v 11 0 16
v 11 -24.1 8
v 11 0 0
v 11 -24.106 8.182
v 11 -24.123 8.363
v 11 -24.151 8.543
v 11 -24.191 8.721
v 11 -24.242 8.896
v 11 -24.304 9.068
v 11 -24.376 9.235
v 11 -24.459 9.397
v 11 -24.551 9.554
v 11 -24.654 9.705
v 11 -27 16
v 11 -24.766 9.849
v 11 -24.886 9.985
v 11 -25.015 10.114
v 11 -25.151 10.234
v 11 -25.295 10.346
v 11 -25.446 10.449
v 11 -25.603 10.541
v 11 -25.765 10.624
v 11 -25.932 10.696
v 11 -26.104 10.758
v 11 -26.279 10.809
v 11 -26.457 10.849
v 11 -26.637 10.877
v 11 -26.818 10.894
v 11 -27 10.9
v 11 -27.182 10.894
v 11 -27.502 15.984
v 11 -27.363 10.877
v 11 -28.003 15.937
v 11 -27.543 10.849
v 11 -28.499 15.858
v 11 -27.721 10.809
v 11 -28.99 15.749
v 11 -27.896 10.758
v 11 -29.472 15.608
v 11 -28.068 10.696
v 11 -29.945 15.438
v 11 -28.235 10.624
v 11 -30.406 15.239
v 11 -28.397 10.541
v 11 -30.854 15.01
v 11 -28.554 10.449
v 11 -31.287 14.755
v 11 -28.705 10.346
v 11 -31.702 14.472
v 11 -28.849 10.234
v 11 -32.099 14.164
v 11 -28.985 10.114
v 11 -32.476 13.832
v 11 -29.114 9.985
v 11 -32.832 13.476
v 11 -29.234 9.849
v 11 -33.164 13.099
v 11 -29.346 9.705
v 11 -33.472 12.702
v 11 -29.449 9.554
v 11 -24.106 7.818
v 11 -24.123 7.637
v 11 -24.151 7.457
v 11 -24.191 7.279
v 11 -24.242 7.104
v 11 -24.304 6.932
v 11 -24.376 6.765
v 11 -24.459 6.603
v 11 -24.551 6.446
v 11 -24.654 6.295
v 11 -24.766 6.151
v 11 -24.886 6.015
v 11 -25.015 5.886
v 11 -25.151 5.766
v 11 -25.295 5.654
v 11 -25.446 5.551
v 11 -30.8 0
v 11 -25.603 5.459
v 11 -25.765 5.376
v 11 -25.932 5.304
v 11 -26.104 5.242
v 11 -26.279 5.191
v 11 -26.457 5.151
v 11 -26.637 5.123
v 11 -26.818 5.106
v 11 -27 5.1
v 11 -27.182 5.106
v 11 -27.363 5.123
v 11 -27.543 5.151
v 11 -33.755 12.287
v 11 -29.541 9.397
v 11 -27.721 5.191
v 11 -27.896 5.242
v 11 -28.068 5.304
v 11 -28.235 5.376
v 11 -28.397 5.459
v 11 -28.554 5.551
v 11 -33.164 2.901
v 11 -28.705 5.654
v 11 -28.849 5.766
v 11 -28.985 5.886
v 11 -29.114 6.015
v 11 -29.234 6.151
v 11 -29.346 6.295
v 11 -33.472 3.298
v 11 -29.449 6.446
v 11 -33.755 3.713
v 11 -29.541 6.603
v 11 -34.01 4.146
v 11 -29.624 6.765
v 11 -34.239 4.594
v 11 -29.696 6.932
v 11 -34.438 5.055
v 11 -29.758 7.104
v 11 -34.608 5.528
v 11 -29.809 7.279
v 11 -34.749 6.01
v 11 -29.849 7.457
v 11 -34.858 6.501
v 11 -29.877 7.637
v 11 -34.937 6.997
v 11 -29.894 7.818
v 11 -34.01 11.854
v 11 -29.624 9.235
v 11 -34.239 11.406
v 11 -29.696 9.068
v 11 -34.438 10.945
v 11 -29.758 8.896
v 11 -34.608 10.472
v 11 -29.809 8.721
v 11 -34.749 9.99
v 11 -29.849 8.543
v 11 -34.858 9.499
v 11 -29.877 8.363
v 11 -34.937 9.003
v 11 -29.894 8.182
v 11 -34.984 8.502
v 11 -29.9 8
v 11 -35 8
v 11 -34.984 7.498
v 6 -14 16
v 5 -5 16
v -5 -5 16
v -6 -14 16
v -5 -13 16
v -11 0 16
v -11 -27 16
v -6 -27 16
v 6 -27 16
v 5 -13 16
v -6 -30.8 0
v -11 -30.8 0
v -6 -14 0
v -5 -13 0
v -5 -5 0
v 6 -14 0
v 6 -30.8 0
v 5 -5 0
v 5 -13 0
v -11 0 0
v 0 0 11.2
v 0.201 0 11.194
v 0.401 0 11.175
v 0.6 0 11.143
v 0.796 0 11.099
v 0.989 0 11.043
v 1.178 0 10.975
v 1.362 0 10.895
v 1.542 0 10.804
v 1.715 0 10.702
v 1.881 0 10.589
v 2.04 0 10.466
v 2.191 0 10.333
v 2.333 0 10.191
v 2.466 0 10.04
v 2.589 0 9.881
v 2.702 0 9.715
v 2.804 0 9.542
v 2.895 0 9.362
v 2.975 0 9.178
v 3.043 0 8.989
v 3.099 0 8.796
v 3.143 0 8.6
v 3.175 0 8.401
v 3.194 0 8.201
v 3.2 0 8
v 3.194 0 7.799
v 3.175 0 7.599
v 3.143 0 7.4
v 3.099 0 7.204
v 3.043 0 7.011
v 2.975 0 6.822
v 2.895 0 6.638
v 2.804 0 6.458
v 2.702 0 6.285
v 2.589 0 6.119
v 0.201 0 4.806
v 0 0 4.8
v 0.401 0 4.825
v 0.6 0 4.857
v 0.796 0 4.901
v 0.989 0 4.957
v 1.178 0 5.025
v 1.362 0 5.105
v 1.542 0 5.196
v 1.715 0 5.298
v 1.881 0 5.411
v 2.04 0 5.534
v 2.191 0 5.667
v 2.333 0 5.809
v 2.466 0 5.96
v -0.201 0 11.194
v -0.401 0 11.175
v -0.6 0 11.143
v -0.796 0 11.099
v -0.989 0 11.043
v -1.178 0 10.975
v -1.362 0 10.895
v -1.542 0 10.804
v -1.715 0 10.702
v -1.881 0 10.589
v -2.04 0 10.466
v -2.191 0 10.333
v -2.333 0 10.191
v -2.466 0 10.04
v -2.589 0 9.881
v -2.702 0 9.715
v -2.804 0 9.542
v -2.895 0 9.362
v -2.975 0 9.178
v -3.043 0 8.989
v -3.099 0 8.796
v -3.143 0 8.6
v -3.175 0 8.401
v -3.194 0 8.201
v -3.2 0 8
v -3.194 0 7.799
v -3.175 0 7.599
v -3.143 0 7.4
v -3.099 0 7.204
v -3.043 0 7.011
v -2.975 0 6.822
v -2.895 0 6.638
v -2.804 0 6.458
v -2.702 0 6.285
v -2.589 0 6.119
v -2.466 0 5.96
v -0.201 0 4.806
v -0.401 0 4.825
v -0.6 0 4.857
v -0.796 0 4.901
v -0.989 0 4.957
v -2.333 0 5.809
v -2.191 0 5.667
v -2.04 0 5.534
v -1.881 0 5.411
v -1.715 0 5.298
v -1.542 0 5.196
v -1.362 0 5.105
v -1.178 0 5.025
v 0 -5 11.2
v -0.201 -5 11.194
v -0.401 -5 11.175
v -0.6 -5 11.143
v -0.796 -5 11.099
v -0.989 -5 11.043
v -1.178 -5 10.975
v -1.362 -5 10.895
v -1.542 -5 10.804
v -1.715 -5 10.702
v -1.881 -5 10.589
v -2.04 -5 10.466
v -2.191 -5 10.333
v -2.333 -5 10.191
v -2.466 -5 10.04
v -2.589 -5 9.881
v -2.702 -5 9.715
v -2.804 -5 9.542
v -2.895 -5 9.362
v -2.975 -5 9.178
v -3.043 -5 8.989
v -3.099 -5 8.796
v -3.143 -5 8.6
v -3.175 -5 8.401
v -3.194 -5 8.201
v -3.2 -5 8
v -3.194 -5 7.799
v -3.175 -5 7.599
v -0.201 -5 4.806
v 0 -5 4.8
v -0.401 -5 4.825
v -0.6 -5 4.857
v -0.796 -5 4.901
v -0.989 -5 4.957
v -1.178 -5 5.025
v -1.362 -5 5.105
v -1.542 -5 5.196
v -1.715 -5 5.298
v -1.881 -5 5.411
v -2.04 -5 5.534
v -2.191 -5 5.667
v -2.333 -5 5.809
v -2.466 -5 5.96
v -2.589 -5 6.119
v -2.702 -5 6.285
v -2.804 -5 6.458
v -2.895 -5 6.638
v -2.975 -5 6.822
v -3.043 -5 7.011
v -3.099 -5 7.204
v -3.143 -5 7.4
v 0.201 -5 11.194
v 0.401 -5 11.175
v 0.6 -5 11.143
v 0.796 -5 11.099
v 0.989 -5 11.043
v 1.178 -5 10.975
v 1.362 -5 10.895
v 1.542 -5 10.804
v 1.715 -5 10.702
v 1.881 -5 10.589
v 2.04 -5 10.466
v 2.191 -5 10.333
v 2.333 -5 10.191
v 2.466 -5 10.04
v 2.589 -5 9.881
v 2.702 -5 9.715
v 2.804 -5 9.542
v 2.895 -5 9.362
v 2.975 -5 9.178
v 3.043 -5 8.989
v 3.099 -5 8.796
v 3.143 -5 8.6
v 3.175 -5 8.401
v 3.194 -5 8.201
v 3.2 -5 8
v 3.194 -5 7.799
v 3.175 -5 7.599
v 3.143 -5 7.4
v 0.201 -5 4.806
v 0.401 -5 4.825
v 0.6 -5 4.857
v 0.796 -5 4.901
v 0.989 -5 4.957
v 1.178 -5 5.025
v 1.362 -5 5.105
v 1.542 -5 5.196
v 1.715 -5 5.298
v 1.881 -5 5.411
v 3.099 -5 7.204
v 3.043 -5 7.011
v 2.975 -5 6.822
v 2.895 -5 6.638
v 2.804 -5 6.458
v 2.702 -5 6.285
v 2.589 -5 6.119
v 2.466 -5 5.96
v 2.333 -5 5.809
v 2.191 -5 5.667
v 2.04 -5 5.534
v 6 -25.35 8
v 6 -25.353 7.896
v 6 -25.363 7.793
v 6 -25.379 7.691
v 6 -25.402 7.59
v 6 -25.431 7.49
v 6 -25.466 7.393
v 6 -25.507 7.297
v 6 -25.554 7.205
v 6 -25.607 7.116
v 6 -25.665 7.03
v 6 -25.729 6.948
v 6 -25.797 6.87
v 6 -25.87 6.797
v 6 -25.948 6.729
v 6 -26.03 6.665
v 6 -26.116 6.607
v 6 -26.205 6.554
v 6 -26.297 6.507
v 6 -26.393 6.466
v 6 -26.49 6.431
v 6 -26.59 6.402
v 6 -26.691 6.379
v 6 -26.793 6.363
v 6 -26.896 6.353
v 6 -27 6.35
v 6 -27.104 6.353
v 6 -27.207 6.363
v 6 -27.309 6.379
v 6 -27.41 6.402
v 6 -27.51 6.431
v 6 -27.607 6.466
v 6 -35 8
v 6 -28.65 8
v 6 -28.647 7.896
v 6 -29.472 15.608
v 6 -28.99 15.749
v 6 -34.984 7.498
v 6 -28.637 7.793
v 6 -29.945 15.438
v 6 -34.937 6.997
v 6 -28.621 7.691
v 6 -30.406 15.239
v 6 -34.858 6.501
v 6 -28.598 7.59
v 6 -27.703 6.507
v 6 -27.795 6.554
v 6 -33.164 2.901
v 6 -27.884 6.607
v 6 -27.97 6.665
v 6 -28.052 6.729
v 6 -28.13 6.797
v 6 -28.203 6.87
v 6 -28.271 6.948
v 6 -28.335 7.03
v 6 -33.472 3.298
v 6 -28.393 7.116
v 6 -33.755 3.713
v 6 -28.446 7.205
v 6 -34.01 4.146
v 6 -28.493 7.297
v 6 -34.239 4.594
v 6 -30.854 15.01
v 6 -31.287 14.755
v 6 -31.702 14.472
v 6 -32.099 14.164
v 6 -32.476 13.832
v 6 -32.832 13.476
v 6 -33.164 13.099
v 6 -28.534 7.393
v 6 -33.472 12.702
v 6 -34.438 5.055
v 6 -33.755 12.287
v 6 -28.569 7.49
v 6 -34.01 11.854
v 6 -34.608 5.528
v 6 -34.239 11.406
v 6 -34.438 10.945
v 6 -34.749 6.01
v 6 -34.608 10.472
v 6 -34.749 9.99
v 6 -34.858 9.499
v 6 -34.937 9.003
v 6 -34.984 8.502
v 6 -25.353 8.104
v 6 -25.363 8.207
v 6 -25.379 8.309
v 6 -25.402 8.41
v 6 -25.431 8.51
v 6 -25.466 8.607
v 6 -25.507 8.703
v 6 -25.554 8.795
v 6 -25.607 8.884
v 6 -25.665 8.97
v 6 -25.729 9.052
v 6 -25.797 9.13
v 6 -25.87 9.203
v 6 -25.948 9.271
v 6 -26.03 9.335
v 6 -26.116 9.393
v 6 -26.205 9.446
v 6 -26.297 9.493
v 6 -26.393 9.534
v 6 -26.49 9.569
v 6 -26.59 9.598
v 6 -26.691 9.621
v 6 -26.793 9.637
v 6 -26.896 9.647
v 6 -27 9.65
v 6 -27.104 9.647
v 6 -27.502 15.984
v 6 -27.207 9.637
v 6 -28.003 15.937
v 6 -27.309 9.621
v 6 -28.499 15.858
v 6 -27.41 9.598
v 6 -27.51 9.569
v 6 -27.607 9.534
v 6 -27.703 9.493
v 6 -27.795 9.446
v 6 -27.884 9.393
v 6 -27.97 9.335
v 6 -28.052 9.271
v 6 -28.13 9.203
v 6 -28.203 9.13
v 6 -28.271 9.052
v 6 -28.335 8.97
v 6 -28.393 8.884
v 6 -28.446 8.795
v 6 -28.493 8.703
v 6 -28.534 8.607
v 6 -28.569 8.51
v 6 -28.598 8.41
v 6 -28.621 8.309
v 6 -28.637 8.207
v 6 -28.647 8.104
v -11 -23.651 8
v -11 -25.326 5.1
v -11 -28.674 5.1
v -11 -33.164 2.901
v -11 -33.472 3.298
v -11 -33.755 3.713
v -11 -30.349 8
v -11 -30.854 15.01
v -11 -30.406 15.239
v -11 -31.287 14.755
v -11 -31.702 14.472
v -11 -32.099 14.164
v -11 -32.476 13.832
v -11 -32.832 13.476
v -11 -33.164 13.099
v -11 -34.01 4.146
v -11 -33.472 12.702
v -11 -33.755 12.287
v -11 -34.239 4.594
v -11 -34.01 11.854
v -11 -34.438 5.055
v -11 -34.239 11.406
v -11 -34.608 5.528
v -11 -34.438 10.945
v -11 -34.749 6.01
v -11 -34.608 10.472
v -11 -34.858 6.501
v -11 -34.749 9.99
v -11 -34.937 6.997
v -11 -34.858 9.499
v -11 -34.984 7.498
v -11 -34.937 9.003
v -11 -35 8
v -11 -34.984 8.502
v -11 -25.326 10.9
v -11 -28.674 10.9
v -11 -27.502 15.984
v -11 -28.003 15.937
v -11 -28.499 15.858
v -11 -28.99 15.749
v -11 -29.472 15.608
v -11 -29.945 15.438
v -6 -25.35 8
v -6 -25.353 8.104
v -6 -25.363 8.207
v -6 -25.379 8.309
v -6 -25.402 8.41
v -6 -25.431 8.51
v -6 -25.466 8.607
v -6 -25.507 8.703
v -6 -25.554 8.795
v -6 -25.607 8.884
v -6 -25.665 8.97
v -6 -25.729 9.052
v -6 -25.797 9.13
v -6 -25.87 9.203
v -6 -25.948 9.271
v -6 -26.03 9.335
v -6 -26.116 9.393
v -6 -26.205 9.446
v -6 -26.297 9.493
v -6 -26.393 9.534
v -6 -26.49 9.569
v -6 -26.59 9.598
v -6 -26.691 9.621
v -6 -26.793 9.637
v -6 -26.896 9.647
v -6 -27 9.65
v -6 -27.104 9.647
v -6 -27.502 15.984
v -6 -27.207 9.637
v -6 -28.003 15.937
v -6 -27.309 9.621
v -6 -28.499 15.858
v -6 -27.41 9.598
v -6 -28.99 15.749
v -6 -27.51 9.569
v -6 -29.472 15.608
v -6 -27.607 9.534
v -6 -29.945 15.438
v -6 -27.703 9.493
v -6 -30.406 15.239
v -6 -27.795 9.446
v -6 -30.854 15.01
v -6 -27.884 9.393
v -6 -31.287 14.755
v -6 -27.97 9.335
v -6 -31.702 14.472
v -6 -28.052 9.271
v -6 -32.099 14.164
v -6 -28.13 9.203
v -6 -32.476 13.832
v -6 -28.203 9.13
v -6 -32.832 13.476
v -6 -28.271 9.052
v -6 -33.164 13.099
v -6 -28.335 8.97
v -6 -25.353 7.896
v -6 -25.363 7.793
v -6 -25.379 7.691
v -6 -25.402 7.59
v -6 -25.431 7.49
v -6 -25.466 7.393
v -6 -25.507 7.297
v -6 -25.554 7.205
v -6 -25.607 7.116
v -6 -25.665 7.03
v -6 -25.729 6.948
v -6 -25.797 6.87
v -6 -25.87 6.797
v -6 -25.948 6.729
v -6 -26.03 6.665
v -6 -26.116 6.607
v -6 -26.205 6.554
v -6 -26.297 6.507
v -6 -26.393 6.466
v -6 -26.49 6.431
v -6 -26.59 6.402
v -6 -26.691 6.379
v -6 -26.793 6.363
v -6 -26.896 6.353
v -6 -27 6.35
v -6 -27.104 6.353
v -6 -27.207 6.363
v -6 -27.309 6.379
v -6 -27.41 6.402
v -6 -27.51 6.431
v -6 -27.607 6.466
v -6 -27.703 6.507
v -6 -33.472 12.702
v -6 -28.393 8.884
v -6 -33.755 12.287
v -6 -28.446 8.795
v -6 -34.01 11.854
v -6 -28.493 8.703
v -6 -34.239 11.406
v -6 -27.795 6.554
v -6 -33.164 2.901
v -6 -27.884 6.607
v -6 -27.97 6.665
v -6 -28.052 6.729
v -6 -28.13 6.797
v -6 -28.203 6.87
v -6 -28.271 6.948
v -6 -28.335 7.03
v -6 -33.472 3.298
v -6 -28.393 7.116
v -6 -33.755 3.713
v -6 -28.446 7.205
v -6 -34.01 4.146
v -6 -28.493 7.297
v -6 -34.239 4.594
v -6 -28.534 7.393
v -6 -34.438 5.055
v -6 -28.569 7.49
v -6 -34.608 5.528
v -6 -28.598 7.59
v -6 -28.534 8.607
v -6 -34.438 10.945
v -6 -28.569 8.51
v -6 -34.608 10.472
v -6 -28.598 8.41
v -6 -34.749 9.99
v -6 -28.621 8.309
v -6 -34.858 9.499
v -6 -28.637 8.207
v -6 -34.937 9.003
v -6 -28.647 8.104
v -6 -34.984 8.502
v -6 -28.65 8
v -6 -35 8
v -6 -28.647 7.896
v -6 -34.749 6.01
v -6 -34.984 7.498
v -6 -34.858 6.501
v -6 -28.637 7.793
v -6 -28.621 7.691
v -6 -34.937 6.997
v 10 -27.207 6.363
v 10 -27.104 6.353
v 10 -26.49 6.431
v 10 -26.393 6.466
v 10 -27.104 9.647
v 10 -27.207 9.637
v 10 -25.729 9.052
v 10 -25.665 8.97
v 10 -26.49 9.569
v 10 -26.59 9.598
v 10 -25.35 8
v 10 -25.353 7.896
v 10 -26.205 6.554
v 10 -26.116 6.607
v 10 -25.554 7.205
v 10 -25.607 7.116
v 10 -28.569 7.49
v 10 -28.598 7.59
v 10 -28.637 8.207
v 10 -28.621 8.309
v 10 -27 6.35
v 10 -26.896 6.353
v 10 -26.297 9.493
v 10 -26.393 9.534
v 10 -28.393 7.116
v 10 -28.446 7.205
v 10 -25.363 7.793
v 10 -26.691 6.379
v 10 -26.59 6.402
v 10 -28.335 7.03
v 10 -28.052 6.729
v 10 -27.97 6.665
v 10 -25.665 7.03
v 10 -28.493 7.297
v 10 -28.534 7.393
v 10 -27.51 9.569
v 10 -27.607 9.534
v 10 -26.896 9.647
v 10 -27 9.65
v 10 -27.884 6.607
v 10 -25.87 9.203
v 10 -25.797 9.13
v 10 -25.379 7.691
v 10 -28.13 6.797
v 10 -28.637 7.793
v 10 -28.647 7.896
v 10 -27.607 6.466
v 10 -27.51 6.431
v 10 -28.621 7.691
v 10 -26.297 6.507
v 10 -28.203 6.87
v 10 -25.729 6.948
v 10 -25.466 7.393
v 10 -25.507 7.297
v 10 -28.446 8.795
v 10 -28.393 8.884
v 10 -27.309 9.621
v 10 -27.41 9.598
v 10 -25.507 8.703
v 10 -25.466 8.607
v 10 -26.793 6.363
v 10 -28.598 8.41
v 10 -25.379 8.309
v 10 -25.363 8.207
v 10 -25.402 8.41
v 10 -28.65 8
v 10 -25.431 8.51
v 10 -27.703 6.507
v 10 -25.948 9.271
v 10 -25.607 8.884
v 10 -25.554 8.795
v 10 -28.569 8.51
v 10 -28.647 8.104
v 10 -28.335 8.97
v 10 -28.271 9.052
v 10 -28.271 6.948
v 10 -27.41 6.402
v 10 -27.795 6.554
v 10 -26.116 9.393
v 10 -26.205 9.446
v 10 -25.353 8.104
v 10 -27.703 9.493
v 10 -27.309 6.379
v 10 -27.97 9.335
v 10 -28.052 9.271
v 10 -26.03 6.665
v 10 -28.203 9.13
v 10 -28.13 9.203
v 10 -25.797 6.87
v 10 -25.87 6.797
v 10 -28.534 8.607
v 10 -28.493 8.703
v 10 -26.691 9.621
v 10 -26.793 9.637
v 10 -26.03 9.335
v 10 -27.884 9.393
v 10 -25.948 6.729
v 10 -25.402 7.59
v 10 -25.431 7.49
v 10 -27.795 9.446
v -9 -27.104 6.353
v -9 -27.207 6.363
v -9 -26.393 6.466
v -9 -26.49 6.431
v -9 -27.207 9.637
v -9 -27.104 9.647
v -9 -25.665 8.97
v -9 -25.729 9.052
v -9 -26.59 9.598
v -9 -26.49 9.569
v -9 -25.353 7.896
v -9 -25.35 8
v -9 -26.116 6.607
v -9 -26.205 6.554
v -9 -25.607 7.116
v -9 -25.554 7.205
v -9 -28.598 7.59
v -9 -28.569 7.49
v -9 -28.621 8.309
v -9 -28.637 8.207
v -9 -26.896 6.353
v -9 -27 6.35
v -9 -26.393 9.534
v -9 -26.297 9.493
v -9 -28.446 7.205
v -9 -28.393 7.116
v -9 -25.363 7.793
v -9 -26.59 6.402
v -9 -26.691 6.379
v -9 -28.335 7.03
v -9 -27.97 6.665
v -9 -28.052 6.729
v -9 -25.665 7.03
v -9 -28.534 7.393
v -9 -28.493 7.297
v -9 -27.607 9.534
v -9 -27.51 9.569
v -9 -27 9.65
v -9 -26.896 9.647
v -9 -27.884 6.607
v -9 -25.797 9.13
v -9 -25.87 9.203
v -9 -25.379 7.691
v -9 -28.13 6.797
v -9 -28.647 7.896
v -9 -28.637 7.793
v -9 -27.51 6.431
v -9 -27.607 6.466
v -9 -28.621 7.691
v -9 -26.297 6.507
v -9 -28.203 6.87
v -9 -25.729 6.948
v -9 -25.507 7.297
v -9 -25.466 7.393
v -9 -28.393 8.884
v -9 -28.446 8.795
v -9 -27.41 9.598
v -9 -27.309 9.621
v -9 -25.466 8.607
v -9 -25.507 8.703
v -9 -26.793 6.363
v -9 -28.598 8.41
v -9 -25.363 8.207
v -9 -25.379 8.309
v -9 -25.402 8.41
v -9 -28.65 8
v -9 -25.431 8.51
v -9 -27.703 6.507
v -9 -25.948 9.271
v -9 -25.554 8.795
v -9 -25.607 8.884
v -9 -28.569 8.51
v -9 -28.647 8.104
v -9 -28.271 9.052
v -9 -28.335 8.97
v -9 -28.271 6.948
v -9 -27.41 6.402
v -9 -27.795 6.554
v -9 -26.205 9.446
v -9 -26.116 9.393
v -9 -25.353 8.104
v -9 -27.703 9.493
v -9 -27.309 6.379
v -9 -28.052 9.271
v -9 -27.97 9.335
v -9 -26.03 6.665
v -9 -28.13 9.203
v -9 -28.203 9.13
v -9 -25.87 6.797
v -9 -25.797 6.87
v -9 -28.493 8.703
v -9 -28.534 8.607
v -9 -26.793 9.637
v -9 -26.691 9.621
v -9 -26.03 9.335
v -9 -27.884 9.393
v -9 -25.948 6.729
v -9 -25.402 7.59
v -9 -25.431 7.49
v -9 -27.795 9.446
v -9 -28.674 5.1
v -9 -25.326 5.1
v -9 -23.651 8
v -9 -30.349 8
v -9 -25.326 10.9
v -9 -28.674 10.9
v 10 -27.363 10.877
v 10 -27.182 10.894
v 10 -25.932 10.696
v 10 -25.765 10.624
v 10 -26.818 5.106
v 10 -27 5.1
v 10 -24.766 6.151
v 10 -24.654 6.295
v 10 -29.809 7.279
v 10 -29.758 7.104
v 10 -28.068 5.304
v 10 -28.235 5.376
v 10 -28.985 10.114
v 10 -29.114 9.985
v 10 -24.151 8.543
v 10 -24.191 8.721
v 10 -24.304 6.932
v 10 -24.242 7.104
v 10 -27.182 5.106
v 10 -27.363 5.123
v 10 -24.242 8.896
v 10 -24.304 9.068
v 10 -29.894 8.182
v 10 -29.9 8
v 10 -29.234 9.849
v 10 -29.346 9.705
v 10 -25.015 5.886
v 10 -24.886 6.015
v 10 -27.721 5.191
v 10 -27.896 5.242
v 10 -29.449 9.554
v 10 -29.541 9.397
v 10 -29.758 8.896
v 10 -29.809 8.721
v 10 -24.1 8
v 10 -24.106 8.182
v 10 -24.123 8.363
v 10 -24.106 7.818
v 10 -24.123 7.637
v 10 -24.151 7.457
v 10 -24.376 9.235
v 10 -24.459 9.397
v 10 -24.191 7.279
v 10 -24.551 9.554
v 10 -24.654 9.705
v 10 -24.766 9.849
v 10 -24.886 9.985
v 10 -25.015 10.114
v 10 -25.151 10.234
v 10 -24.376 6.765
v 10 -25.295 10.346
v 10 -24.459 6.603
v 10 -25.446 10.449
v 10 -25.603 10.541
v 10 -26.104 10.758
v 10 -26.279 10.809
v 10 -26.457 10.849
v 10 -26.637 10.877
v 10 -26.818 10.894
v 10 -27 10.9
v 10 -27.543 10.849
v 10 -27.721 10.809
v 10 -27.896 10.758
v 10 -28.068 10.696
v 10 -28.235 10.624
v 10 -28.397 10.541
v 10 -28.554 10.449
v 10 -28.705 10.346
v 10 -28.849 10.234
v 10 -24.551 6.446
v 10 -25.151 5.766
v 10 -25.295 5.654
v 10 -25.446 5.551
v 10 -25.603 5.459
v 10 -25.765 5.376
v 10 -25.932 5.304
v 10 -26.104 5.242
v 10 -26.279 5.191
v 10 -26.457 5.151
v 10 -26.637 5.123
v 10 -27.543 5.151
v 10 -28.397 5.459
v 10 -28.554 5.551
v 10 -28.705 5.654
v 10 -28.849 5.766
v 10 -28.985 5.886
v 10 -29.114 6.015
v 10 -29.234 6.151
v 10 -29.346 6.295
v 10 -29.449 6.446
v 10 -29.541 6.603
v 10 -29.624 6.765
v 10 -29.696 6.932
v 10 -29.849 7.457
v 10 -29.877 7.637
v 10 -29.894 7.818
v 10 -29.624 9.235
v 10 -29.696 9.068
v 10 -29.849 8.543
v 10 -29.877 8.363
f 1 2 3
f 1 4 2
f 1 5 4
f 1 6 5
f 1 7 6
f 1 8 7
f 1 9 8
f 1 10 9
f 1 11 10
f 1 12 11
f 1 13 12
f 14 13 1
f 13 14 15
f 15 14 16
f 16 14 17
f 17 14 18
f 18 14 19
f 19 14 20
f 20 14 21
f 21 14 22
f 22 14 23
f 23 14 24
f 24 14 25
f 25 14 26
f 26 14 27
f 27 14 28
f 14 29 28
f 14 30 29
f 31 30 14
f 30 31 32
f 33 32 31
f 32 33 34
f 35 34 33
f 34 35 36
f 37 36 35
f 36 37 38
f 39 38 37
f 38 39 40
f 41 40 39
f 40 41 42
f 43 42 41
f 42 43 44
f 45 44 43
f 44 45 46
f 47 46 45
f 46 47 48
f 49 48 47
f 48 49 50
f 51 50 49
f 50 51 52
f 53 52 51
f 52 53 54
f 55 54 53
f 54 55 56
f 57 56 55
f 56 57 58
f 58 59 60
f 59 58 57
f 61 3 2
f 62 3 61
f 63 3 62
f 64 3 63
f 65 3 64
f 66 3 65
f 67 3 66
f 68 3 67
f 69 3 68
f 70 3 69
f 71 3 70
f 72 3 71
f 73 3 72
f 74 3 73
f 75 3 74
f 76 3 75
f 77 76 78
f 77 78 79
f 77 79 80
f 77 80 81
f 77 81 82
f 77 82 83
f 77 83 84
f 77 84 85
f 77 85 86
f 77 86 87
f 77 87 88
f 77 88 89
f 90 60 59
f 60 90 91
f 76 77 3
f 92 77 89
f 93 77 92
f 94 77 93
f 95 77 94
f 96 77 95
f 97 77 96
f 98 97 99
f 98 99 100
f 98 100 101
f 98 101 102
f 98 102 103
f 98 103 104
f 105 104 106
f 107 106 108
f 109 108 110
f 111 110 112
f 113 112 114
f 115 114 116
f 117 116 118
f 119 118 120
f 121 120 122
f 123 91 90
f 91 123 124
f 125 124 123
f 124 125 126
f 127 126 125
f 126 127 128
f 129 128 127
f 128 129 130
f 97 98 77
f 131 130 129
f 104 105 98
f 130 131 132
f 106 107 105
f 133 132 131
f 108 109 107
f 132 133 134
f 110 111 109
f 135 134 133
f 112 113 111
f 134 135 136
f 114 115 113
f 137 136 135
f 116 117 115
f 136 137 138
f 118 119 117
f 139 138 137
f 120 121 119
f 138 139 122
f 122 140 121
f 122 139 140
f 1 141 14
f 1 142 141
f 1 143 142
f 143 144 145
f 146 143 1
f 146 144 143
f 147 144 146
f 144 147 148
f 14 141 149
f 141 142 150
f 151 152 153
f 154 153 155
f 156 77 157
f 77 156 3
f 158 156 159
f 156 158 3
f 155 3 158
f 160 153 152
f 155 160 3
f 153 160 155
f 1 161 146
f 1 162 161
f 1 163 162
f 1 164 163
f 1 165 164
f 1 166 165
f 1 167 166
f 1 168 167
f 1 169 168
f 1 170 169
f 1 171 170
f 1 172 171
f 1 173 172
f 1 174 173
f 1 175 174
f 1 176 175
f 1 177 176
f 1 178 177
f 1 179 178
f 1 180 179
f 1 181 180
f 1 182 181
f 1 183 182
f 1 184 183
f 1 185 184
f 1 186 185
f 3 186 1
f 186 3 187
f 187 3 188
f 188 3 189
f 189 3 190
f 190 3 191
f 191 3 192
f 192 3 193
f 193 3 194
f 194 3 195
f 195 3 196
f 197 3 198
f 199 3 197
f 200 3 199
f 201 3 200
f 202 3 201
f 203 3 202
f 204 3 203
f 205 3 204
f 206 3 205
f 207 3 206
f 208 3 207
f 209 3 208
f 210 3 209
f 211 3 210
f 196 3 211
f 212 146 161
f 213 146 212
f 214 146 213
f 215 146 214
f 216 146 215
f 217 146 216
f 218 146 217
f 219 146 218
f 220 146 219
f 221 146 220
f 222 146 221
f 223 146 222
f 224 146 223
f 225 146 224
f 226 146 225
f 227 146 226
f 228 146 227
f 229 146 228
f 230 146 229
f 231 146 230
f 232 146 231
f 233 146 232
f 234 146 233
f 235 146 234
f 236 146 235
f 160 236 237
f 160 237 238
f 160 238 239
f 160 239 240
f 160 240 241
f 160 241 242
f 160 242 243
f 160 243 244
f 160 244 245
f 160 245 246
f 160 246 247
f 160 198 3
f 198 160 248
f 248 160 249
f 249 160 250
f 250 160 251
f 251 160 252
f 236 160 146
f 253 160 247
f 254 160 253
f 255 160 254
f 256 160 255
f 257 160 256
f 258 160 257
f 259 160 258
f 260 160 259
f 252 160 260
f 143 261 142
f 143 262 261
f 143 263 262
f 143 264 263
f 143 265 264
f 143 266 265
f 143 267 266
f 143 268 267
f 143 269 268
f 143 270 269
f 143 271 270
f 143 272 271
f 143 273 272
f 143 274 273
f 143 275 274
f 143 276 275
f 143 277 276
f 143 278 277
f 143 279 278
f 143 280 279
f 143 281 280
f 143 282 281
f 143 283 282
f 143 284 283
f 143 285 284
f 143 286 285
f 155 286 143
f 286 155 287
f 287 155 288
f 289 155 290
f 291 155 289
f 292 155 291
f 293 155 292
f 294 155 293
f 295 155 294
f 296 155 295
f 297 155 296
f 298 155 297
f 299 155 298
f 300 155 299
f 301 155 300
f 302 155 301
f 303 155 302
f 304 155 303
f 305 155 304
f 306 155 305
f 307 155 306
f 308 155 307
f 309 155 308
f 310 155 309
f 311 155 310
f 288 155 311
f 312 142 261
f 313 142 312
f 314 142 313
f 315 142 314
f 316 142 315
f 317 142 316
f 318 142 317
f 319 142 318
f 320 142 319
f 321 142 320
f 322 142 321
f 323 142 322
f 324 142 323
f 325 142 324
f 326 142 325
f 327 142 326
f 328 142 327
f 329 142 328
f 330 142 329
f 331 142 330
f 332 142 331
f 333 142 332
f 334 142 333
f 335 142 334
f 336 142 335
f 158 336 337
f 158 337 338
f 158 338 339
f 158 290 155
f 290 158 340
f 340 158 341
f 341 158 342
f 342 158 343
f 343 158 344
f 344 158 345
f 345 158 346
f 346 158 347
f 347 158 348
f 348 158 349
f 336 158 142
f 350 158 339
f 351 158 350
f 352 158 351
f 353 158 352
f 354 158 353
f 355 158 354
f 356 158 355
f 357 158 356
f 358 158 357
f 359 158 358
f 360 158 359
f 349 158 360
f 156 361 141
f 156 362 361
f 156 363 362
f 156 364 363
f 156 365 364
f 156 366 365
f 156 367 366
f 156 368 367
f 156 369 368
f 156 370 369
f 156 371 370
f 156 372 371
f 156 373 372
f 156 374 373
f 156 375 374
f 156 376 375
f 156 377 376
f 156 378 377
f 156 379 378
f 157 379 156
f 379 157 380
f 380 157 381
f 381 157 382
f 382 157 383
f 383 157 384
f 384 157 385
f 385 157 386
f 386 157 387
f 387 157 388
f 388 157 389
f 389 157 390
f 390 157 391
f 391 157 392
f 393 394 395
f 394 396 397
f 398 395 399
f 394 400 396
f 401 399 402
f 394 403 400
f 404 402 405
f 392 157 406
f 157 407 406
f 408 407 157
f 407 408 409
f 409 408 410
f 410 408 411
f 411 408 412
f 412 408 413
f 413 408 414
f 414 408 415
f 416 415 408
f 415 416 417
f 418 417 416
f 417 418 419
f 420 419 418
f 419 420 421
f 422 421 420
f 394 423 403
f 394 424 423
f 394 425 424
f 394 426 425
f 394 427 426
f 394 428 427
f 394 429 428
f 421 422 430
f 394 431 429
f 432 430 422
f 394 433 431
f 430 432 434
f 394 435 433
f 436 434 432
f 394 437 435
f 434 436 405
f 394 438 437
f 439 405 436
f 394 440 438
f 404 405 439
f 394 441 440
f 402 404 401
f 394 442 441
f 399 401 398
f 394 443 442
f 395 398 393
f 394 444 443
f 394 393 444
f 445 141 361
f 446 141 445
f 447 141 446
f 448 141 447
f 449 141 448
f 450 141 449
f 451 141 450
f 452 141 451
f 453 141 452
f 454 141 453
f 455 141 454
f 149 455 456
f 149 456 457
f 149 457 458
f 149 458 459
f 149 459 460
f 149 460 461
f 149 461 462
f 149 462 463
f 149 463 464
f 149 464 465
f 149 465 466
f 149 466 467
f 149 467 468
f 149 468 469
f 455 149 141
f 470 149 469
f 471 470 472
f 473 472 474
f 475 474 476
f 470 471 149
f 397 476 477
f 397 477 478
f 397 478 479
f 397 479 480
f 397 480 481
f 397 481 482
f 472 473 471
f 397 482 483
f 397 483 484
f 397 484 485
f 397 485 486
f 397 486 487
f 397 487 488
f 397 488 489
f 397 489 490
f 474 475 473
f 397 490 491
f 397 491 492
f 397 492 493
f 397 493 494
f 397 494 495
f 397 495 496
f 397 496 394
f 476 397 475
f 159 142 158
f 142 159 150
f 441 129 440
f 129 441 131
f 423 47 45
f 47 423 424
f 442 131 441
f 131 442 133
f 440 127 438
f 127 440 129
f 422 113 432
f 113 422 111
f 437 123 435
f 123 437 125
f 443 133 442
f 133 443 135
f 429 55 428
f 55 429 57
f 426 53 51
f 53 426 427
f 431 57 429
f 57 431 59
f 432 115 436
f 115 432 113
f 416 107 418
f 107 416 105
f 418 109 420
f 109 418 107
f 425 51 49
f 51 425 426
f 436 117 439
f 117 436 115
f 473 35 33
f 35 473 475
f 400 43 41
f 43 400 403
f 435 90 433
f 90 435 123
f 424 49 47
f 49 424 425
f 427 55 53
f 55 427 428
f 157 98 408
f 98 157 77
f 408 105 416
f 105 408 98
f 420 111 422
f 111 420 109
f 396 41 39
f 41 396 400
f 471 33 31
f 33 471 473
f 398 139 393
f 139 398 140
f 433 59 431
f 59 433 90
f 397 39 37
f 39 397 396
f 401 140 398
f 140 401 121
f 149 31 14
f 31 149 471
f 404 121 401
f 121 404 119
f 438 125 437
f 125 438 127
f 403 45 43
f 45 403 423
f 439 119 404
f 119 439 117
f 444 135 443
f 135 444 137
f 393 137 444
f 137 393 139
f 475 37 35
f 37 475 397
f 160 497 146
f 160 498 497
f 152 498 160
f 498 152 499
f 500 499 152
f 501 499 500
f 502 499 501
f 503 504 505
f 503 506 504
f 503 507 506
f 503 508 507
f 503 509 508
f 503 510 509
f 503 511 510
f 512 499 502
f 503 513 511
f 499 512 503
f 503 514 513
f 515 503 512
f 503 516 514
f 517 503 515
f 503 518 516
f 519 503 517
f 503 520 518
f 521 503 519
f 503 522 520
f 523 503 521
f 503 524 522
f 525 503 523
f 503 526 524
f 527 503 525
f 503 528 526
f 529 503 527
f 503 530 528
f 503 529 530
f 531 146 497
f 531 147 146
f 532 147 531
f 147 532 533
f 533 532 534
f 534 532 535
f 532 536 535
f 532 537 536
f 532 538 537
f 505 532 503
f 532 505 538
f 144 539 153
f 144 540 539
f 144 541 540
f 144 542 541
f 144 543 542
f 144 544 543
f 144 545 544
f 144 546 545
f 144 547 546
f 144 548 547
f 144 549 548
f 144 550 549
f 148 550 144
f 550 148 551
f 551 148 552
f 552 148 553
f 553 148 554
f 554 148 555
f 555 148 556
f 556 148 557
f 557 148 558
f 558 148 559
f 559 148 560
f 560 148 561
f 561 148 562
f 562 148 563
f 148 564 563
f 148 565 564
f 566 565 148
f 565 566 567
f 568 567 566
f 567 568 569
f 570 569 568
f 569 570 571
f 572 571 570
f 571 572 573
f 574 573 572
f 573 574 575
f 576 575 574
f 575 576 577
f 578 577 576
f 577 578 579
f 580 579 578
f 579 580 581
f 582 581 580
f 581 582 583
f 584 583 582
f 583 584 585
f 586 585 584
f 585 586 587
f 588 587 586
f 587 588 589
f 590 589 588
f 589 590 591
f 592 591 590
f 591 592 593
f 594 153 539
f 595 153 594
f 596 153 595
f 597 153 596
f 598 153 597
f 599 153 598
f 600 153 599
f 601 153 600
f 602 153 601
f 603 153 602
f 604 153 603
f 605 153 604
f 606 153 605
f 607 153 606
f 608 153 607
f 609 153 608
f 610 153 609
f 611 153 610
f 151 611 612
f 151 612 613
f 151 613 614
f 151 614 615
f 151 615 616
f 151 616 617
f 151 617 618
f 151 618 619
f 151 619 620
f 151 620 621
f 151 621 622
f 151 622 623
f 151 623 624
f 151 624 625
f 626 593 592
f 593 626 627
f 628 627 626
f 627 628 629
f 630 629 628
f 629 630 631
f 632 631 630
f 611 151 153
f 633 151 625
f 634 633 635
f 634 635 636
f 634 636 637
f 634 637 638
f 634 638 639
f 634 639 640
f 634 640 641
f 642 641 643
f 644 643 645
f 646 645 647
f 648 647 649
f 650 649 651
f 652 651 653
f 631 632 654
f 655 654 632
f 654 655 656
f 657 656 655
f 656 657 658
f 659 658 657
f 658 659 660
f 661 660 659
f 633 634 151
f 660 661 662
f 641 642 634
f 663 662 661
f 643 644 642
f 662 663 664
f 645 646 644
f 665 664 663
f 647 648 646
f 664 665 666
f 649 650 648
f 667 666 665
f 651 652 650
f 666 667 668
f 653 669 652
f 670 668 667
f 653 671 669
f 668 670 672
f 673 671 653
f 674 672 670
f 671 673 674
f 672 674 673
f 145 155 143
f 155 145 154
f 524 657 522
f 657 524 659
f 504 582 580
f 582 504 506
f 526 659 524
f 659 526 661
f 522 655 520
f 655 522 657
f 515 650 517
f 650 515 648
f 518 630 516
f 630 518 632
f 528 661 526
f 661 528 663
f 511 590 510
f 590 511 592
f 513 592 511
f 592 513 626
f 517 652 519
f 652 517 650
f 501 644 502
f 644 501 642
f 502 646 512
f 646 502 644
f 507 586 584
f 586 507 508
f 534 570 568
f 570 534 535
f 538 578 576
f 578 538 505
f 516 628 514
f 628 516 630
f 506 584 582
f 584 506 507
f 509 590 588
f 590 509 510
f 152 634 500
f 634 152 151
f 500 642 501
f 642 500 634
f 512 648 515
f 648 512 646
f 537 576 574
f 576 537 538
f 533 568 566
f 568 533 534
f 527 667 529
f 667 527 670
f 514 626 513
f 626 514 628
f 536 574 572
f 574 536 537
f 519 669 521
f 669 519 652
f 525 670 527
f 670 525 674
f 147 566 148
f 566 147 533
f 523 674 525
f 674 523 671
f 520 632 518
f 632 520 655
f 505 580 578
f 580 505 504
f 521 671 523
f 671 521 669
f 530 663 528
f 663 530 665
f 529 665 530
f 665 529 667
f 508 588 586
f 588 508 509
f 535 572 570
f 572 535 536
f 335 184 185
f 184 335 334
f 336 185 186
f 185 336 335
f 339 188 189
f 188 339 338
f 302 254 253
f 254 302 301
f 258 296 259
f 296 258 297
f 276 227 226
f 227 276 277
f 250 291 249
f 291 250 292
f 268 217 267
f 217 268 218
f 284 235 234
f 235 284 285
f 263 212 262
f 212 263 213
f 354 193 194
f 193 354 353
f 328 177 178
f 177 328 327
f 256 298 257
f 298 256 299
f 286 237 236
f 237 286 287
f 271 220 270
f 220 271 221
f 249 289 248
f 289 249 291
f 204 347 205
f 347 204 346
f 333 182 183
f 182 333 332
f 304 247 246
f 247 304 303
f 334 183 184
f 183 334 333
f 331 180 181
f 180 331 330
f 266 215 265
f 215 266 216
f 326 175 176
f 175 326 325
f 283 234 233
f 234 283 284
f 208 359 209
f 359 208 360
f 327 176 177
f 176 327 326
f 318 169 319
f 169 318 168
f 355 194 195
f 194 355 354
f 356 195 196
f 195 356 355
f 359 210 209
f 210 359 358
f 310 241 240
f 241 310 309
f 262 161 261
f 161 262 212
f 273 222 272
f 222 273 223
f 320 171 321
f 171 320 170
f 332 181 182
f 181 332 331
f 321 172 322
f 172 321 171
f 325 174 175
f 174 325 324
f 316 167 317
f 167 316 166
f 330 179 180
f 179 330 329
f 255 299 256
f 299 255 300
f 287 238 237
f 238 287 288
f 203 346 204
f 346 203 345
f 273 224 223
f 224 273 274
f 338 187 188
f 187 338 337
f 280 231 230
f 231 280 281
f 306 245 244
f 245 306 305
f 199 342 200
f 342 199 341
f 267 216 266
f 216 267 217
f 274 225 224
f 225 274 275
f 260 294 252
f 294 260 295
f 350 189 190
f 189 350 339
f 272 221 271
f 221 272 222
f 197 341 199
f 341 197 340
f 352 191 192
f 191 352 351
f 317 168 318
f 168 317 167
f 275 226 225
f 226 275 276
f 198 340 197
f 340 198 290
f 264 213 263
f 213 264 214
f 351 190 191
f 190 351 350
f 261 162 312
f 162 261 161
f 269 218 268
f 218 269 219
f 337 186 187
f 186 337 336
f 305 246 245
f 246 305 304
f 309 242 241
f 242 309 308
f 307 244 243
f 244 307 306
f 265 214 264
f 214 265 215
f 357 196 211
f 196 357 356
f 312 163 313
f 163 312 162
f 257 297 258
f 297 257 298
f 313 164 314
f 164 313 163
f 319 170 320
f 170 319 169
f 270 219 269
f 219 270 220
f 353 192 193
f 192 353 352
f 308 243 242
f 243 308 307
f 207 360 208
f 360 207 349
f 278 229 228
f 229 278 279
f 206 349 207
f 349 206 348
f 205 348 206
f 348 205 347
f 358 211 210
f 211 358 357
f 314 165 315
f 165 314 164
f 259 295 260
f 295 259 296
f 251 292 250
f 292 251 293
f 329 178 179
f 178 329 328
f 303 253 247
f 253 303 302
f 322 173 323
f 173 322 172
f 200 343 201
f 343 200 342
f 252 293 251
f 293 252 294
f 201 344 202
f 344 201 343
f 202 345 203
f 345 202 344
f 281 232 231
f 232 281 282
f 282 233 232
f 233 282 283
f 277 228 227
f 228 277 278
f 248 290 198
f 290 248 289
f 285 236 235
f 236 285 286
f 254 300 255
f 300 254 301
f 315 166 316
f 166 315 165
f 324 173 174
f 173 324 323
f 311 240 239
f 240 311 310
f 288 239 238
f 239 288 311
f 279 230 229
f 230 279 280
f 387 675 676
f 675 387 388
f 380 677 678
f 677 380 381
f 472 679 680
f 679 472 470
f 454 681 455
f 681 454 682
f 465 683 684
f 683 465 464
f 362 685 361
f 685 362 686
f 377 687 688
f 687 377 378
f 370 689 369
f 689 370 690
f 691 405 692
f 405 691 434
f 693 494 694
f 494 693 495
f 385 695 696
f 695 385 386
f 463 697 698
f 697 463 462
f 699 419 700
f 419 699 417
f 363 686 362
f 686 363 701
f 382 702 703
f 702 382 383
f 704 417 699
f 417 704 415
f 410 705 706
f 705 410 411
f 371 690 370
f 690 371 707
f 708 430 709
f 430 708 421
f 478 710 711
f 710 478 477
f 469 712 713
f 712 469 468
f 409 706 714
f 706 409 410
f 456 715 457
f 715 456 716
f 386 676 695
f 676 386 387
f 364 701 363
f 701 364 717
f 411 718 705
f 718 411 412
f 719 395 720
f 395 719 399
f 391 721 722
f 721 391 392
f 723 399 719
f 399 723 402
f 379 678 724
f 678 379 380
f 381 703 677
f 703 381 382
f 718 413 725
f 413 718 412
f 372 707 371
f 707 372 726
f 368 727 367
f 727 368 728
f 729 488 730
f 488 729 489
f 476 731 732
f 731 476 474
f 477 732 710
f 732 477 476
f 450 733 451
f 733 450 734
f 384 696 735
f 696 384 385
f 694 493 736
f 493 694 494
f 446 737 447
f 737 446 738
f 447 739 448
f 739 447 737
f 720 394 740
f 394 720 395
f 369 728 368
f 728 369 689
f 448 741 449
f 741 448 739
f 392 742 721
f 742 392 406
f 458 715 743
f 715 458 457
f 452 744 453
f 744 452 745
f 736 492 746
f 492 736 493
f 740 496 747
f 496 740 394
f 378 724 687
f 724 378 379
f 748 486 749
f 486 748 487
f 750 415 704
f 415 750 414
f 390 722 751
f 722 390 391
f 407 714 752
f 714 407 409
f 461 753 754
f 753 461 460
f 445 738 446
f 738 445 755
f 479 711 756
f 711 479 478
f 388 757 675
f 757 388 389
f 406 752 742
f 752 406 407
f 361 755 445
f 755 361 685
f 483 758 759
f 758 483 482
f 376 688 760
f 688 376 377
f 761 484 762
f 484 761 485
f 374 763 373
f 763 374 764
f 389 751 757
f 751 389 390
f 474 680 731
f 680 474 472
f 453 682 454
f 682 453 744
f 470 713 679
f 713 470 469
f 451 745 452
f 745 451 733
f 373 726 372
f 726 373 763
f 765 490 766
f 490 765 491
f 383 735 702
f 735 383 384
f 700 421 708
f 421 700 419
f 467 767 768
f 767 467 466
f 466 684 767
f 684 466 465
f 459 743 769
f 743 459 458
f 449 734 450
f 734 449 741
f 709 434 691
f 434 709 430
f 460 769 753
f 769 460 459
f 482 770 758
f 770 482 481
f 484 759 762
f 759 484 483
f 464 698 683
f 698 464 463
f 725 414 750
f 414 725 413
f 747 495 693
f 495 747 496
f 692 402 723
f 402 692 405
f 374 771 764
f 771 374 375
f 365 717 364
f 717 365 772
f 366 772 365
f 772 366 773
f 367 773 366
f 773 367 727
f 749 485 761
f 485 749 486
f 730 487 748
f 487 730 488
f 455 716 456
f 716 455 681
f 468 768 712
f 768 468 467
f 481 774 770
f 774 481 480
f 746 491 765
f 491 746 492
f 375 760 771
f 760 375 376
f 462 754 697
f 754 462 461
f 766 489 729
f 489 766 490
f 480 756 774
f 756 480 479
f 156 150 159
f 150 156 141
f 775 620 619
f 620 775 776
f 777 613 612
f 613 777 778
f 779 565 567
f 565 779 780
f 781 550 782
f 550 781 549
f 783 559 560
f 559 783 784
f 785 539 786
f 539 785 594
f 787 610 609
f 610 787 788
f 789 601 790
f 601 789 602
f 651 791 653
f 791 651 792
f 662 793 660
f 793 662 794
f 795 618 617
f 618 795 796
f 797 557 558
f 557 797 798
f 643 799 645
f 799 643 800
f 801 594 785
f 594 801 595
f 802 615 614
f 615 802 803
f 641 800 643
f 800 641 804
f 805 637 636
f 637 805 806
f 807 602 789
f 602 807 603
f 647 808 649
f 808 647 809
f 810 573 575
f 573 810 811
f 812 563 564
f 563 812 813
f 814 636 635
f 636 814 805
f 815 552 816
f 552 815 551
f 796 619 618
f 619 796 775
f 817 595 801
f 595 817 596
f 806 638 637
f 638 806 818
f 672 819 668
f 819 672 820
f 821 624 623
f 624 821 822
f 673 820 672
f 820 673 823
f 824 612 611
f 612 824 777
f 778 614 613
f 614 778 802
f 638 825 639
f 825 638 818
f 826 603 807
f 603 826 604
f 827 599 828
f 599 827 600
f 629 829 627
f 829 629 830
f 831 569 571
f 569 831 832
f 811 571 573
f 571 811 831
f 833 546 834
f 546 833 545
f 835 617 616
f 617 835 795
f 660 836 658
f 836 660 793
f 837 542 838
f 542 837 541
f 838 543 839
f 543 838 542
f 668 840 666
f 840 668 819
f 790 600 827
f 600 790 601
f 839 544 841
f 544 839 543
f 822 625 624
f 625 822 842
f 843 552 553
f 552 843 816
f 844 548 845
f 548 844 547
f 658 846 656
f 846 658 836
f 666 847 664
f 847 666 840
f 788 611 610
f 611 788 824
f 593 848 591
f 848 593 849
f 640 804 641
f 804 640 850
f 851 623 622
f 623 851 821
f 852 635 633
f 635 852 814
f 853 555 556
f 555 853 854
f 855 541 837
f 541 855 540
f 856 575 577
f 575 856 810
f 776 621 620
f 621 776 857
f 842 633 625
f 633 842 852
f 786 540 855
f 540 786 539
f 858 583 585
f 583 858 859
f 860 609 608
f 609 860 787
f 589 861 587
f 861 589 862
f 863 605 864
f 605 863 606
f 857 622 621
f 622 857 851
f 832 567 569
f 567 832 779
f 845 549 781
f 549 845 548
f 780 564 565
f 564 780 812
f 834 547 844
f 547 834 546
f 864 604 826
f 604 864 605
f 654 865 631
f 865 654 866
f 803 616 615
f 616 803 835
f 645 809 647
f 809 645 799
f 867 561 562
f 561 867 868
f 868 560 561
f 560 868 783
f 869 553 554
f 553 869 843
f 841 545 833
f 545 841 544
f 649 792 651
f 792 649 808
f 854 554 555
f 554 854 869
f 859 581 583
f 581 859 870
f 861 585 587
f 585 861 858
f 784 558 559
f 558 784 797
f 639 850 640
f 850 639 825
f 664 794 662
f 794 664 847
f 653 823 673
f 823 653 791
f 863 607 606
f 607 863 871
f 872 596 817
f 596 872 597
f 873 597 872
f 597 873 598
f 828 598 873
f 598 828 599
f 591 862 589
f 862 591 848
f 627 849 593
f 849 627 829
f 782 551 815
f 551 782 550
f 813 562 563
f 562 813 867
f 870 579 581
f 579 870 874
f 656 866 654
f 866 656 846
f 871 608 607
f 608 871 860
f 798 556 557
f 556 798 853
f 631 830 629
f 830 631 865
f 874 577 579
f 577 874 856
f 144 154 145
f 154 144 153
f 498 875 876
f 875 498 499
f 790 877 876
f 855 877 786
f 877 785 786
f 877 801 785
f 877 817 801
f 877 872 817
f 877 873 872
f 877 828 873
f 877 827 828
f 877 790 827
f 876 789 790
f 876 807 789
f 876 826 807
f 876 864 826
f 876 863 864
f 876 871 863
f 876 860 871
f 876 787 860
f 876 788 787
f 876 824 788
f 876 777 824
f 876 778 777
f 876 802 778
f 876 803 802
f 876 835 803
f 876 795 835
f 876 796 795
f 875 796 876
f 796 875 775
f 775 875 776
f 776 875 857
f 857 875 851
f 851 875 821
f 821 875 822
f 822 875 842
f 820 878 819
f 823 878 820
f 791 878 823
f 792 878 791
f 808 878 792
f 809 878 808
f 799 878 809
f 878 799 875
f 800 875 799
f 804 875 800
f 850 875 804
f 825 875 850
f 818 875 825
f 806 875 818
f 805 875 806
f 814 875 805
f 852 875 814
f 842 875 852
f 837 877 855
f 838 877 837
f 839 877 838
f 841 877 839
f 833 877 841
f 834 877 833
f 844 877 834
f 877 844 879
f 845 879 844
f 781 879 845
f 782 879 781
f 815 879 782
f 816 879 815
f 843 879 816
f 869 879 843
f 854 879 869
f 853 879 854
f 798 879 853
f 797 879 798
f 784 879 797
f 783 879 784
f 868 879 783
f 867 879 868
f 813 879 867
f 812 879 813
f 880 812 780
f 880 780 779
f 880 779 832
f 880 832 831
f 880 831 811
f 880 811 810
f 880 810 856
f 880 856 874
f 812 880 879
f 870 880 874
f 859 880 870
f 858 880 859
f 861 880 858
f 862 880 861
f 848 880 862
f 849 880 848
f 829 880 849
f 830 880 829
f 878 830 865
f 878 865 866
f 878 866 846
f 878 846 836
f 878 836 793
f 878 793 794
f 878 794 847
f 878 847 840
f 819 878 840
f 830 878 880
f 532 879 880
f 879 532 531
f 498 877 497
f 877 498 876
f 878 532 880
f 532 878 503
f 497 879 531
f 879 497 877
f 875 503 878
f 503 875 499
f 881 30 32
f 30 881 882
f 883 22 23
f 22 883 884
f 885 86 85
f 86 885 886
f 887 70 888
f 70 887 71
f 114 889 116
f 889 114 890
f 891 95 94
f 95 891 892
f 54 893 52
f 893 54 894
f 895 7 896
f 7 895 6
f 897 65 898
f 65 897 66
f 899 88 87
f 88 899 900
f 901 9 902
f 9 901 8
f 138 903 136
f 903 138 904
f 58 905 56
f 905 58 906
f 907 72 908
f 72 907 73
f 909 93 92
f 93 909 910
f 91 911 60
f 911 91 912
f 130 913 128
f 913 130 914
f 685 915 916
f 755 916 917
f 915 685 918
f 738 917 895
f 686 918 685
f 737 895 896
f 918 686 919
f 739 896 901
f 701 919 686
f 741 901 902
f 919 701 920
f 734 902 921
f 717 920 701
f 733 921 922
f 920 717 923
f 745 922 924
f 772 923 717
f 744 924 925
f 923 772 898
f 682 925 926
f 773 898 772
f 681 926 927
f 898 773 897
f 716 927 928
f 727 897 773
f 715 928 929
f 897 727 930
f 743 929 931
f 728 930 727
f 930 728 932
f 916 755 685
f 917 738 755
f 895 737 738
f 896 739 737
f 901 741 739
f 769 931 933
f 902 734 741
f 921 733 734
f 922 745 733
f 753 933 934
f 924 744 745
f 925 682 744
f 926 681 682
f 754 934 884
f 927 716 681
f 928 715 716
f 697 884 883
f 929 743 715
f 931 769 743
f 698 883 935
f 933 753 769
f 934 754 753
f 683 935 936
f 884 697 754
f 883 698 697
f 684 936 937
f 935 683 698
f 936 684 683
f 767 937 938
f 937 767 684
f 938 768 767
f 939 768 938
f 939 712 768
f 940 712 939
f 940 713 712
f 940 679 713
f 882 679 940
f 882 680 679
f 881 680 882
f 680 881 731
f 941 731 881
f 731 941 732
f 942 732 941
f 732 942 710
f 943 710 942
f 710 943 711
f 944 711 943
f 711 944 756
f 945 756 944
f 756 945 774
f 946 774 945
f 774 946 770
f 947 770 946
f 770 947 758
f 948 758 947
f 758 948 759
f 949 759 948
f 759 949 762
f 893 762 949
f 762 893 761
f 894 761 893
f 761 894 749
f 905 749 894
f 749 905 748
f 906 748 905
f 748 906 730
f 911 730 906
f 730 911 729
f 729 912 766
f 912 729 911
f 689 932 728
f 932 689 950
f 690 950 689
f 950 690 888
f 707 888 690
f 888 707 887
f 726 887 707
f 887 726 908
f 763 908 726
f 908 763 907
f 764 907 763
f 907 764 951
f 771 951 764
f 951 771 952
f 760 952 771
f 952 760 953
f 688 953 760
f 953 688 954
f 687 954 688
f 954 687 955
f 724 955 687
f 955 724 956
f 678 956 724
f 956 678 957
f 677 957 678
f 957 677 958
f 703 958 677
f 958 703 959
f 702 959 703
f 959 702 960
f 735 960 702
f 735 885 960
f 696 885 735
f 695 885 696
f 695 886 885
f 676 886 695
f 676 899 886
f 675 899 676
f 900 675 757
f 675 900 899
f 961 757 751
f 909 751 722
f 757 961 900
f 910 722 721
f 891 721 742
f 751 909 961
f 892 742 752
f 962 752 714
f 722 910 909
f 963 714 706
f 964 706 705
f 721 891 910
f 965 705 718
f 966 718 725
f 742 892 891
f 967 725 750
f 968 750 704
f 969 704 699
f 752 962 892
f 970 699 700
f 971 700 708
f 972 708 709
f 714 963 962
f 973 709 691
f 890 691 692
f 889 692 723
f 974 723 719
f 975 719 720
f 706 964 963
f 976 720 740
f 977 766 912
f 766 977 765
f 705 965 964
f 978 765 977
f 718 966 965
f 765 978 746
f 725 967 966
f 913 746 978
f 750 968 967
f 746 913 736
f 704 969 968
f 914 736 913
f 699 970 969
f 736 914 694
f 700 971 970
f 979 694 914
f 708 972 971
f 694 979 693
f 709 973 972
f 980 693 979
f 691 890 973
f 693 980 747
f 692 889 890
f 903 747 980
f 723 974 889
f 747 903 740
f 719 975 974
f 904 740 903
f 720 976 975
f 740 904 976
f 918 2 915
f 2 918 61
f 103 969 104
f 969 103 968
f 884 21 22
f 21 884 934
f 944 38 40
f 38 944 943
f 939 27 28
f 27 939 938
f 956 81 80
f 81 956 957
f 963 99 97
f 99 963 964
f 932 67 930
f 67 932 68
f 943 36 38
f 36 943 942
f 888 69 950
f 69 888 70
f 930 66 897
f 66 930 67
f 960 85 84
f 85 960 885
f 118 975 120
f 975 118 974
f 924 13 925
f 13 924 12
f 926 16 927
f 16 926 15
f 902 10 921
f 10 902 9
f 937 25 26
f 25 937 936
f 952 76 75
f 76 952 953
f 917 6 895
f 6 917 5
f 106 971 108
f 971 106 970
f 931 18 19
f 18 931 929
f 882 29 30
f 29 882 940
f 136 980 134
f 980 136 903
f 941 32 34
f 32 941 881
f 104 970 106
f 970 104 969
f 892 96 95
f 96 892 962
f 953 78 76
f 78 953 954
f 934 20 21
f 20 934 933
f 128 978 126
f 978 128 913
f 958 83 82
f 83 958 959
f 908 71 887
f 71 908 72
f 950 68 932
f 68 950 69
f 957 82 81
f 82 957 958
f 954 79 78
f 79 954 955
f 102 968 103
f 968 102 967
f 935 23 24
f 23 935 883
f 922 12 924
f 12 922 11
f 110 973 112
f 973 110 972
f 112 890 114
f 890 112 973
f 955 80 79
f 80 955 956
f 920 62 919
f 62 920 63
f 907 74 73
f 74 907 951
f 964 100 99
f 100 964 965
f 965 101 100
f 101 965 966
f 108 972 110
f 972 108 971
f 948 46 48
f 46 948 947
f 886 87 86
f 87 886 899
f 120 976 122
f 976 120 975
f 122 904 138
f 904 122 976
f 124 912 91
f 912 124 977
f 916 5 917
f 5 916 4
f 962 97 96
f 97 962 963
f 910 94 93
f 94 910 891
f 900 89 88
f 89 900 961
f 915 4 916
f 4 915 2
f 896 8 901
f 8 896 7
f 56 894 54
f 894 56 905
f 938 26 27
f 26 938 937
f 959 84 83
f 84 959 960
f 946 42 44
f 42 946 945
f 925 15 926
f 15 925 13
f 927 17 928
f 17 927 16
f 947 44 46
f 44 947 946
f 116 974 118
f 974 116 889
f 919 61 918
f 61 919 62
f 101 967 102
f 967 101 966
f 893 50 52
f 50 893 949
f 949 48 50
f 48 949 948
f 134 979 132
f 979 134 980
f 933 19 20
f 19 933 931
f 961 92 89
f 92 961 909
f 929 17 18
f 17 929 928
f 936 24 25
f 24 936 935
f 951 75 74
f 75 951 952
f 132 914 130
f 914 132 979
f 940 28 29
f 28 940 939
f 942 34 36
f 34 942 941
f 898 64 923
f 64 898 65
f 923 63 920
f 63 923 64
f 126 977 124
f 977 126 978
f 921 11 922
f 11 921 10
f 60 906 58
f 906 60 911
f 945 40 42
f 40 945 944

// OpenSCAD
// Created from Code_Yidler_623.stl
// https://github.com/Mecan0/Code
// By J.Rodigo (www.jra.so)
// Licence Creative commons atribution & share alike.

/**************************/
// Parámetros de la pieza  /
/**************************/

dTal = 6.4;		// Diámetro del taladro (Soporte) (6.4)

//Características del tornillo (Polea)
dTor = 3.3;		// Diámetro de la rosca (3.3)
dCab = 5.8;		// Diámetro de la cabeza (5.6)
hHex = 5.8;		// Altura entre caras planas de la tuerca (5.8)


// Media pieza
module mpieza(){
	// Bloque a lo largo del eje X
		translate([0, -5, 0])
		cube([11, 5, 16]);

	//	Bloque a lo largo del eje Y
	//	Bloque grande
		translate([6, -27, 0])
		cube([5, 27, 16]);
	//	Bloque pequeño
		translate([5, -14, 0])
		cube([1, 9, 16]);
		hull(){
			//	Redondeo
			translate([6, -27, 8])
			rotate( 90, [0, 1, 0])
			cylinder(h = 5, r = 8, $fn=100);
			// Chaflán inferior
			translate([6, -30.8, 0])
			cube([5, 10, 1]);
		}
}

// Operaciones para media pieza
module moperaciones(){
	// Taladro del soporte
	translate([0, 1, 8])
	rotate( 90, [1, 0, 0])
	cylinder(h = 7, r = dTal/2, $fn=100);
	// Taladro para la polea
	translate([5, -27, 8])
	rotate( 90, [0, 1, 0])
	cylinder(h = 7, r = dTor/2, $fn=100);
	// Chaflán interior
	translate([6, -14, -1])
	rotate( 225, [0, 0, -1])
	cube([2, 1, 18]);
}

// Generar un hexágono circunscrito (Diámetro,Altura) 
module hexagono(d,h){ 
	for (a = [0, 60,120]){ 
		rotate( a, [0, 0, 1])
		cube([d, d*tan(30), h], center = true);
	}
}

// Alojamiento de la cabeza del tornillo 
module tcab(){ 
	translate([10, -27, 8])
	rotate( 90, [0, 1, 0])
	cylinder(h = 2, r = dCab/2, $fn=100);
}

// Alojamiento de la tuerca
module tuerca(){ 
	translate([-11, -27, 8])
	rotate( 90, [0, 1, 0])
	hexagono(hHex, 4);

}

// Creamos la pieza a partir de las operacione
module pieza(){
	difference () {
		union() {
			// Pieza situada en {+X,-Y,+Z}
			mpieza();	
		
			// Pieza simétrica situada en {-X,-Y,+Z}
			mirror([ 1, 0, 0 ])
			mpieza();
		}	
		union() {
			// Operaciones situadas en {+X,-Y,+Z}
			moperaciones();
	
			// Operaciones simétricas situadas en {-X,-Y,+Z}
			mirror([ 1, 0, 0 ])
			moperaciones();

		// Operaciones únicas para cada lado
			// Vaciado para la cabeza del tornillo
			tcab();
			// Vaciado para la tuerca hexagonal 
			tuerca();
		}	
	}
}

// Generamos la pieza!!

	pieza();
